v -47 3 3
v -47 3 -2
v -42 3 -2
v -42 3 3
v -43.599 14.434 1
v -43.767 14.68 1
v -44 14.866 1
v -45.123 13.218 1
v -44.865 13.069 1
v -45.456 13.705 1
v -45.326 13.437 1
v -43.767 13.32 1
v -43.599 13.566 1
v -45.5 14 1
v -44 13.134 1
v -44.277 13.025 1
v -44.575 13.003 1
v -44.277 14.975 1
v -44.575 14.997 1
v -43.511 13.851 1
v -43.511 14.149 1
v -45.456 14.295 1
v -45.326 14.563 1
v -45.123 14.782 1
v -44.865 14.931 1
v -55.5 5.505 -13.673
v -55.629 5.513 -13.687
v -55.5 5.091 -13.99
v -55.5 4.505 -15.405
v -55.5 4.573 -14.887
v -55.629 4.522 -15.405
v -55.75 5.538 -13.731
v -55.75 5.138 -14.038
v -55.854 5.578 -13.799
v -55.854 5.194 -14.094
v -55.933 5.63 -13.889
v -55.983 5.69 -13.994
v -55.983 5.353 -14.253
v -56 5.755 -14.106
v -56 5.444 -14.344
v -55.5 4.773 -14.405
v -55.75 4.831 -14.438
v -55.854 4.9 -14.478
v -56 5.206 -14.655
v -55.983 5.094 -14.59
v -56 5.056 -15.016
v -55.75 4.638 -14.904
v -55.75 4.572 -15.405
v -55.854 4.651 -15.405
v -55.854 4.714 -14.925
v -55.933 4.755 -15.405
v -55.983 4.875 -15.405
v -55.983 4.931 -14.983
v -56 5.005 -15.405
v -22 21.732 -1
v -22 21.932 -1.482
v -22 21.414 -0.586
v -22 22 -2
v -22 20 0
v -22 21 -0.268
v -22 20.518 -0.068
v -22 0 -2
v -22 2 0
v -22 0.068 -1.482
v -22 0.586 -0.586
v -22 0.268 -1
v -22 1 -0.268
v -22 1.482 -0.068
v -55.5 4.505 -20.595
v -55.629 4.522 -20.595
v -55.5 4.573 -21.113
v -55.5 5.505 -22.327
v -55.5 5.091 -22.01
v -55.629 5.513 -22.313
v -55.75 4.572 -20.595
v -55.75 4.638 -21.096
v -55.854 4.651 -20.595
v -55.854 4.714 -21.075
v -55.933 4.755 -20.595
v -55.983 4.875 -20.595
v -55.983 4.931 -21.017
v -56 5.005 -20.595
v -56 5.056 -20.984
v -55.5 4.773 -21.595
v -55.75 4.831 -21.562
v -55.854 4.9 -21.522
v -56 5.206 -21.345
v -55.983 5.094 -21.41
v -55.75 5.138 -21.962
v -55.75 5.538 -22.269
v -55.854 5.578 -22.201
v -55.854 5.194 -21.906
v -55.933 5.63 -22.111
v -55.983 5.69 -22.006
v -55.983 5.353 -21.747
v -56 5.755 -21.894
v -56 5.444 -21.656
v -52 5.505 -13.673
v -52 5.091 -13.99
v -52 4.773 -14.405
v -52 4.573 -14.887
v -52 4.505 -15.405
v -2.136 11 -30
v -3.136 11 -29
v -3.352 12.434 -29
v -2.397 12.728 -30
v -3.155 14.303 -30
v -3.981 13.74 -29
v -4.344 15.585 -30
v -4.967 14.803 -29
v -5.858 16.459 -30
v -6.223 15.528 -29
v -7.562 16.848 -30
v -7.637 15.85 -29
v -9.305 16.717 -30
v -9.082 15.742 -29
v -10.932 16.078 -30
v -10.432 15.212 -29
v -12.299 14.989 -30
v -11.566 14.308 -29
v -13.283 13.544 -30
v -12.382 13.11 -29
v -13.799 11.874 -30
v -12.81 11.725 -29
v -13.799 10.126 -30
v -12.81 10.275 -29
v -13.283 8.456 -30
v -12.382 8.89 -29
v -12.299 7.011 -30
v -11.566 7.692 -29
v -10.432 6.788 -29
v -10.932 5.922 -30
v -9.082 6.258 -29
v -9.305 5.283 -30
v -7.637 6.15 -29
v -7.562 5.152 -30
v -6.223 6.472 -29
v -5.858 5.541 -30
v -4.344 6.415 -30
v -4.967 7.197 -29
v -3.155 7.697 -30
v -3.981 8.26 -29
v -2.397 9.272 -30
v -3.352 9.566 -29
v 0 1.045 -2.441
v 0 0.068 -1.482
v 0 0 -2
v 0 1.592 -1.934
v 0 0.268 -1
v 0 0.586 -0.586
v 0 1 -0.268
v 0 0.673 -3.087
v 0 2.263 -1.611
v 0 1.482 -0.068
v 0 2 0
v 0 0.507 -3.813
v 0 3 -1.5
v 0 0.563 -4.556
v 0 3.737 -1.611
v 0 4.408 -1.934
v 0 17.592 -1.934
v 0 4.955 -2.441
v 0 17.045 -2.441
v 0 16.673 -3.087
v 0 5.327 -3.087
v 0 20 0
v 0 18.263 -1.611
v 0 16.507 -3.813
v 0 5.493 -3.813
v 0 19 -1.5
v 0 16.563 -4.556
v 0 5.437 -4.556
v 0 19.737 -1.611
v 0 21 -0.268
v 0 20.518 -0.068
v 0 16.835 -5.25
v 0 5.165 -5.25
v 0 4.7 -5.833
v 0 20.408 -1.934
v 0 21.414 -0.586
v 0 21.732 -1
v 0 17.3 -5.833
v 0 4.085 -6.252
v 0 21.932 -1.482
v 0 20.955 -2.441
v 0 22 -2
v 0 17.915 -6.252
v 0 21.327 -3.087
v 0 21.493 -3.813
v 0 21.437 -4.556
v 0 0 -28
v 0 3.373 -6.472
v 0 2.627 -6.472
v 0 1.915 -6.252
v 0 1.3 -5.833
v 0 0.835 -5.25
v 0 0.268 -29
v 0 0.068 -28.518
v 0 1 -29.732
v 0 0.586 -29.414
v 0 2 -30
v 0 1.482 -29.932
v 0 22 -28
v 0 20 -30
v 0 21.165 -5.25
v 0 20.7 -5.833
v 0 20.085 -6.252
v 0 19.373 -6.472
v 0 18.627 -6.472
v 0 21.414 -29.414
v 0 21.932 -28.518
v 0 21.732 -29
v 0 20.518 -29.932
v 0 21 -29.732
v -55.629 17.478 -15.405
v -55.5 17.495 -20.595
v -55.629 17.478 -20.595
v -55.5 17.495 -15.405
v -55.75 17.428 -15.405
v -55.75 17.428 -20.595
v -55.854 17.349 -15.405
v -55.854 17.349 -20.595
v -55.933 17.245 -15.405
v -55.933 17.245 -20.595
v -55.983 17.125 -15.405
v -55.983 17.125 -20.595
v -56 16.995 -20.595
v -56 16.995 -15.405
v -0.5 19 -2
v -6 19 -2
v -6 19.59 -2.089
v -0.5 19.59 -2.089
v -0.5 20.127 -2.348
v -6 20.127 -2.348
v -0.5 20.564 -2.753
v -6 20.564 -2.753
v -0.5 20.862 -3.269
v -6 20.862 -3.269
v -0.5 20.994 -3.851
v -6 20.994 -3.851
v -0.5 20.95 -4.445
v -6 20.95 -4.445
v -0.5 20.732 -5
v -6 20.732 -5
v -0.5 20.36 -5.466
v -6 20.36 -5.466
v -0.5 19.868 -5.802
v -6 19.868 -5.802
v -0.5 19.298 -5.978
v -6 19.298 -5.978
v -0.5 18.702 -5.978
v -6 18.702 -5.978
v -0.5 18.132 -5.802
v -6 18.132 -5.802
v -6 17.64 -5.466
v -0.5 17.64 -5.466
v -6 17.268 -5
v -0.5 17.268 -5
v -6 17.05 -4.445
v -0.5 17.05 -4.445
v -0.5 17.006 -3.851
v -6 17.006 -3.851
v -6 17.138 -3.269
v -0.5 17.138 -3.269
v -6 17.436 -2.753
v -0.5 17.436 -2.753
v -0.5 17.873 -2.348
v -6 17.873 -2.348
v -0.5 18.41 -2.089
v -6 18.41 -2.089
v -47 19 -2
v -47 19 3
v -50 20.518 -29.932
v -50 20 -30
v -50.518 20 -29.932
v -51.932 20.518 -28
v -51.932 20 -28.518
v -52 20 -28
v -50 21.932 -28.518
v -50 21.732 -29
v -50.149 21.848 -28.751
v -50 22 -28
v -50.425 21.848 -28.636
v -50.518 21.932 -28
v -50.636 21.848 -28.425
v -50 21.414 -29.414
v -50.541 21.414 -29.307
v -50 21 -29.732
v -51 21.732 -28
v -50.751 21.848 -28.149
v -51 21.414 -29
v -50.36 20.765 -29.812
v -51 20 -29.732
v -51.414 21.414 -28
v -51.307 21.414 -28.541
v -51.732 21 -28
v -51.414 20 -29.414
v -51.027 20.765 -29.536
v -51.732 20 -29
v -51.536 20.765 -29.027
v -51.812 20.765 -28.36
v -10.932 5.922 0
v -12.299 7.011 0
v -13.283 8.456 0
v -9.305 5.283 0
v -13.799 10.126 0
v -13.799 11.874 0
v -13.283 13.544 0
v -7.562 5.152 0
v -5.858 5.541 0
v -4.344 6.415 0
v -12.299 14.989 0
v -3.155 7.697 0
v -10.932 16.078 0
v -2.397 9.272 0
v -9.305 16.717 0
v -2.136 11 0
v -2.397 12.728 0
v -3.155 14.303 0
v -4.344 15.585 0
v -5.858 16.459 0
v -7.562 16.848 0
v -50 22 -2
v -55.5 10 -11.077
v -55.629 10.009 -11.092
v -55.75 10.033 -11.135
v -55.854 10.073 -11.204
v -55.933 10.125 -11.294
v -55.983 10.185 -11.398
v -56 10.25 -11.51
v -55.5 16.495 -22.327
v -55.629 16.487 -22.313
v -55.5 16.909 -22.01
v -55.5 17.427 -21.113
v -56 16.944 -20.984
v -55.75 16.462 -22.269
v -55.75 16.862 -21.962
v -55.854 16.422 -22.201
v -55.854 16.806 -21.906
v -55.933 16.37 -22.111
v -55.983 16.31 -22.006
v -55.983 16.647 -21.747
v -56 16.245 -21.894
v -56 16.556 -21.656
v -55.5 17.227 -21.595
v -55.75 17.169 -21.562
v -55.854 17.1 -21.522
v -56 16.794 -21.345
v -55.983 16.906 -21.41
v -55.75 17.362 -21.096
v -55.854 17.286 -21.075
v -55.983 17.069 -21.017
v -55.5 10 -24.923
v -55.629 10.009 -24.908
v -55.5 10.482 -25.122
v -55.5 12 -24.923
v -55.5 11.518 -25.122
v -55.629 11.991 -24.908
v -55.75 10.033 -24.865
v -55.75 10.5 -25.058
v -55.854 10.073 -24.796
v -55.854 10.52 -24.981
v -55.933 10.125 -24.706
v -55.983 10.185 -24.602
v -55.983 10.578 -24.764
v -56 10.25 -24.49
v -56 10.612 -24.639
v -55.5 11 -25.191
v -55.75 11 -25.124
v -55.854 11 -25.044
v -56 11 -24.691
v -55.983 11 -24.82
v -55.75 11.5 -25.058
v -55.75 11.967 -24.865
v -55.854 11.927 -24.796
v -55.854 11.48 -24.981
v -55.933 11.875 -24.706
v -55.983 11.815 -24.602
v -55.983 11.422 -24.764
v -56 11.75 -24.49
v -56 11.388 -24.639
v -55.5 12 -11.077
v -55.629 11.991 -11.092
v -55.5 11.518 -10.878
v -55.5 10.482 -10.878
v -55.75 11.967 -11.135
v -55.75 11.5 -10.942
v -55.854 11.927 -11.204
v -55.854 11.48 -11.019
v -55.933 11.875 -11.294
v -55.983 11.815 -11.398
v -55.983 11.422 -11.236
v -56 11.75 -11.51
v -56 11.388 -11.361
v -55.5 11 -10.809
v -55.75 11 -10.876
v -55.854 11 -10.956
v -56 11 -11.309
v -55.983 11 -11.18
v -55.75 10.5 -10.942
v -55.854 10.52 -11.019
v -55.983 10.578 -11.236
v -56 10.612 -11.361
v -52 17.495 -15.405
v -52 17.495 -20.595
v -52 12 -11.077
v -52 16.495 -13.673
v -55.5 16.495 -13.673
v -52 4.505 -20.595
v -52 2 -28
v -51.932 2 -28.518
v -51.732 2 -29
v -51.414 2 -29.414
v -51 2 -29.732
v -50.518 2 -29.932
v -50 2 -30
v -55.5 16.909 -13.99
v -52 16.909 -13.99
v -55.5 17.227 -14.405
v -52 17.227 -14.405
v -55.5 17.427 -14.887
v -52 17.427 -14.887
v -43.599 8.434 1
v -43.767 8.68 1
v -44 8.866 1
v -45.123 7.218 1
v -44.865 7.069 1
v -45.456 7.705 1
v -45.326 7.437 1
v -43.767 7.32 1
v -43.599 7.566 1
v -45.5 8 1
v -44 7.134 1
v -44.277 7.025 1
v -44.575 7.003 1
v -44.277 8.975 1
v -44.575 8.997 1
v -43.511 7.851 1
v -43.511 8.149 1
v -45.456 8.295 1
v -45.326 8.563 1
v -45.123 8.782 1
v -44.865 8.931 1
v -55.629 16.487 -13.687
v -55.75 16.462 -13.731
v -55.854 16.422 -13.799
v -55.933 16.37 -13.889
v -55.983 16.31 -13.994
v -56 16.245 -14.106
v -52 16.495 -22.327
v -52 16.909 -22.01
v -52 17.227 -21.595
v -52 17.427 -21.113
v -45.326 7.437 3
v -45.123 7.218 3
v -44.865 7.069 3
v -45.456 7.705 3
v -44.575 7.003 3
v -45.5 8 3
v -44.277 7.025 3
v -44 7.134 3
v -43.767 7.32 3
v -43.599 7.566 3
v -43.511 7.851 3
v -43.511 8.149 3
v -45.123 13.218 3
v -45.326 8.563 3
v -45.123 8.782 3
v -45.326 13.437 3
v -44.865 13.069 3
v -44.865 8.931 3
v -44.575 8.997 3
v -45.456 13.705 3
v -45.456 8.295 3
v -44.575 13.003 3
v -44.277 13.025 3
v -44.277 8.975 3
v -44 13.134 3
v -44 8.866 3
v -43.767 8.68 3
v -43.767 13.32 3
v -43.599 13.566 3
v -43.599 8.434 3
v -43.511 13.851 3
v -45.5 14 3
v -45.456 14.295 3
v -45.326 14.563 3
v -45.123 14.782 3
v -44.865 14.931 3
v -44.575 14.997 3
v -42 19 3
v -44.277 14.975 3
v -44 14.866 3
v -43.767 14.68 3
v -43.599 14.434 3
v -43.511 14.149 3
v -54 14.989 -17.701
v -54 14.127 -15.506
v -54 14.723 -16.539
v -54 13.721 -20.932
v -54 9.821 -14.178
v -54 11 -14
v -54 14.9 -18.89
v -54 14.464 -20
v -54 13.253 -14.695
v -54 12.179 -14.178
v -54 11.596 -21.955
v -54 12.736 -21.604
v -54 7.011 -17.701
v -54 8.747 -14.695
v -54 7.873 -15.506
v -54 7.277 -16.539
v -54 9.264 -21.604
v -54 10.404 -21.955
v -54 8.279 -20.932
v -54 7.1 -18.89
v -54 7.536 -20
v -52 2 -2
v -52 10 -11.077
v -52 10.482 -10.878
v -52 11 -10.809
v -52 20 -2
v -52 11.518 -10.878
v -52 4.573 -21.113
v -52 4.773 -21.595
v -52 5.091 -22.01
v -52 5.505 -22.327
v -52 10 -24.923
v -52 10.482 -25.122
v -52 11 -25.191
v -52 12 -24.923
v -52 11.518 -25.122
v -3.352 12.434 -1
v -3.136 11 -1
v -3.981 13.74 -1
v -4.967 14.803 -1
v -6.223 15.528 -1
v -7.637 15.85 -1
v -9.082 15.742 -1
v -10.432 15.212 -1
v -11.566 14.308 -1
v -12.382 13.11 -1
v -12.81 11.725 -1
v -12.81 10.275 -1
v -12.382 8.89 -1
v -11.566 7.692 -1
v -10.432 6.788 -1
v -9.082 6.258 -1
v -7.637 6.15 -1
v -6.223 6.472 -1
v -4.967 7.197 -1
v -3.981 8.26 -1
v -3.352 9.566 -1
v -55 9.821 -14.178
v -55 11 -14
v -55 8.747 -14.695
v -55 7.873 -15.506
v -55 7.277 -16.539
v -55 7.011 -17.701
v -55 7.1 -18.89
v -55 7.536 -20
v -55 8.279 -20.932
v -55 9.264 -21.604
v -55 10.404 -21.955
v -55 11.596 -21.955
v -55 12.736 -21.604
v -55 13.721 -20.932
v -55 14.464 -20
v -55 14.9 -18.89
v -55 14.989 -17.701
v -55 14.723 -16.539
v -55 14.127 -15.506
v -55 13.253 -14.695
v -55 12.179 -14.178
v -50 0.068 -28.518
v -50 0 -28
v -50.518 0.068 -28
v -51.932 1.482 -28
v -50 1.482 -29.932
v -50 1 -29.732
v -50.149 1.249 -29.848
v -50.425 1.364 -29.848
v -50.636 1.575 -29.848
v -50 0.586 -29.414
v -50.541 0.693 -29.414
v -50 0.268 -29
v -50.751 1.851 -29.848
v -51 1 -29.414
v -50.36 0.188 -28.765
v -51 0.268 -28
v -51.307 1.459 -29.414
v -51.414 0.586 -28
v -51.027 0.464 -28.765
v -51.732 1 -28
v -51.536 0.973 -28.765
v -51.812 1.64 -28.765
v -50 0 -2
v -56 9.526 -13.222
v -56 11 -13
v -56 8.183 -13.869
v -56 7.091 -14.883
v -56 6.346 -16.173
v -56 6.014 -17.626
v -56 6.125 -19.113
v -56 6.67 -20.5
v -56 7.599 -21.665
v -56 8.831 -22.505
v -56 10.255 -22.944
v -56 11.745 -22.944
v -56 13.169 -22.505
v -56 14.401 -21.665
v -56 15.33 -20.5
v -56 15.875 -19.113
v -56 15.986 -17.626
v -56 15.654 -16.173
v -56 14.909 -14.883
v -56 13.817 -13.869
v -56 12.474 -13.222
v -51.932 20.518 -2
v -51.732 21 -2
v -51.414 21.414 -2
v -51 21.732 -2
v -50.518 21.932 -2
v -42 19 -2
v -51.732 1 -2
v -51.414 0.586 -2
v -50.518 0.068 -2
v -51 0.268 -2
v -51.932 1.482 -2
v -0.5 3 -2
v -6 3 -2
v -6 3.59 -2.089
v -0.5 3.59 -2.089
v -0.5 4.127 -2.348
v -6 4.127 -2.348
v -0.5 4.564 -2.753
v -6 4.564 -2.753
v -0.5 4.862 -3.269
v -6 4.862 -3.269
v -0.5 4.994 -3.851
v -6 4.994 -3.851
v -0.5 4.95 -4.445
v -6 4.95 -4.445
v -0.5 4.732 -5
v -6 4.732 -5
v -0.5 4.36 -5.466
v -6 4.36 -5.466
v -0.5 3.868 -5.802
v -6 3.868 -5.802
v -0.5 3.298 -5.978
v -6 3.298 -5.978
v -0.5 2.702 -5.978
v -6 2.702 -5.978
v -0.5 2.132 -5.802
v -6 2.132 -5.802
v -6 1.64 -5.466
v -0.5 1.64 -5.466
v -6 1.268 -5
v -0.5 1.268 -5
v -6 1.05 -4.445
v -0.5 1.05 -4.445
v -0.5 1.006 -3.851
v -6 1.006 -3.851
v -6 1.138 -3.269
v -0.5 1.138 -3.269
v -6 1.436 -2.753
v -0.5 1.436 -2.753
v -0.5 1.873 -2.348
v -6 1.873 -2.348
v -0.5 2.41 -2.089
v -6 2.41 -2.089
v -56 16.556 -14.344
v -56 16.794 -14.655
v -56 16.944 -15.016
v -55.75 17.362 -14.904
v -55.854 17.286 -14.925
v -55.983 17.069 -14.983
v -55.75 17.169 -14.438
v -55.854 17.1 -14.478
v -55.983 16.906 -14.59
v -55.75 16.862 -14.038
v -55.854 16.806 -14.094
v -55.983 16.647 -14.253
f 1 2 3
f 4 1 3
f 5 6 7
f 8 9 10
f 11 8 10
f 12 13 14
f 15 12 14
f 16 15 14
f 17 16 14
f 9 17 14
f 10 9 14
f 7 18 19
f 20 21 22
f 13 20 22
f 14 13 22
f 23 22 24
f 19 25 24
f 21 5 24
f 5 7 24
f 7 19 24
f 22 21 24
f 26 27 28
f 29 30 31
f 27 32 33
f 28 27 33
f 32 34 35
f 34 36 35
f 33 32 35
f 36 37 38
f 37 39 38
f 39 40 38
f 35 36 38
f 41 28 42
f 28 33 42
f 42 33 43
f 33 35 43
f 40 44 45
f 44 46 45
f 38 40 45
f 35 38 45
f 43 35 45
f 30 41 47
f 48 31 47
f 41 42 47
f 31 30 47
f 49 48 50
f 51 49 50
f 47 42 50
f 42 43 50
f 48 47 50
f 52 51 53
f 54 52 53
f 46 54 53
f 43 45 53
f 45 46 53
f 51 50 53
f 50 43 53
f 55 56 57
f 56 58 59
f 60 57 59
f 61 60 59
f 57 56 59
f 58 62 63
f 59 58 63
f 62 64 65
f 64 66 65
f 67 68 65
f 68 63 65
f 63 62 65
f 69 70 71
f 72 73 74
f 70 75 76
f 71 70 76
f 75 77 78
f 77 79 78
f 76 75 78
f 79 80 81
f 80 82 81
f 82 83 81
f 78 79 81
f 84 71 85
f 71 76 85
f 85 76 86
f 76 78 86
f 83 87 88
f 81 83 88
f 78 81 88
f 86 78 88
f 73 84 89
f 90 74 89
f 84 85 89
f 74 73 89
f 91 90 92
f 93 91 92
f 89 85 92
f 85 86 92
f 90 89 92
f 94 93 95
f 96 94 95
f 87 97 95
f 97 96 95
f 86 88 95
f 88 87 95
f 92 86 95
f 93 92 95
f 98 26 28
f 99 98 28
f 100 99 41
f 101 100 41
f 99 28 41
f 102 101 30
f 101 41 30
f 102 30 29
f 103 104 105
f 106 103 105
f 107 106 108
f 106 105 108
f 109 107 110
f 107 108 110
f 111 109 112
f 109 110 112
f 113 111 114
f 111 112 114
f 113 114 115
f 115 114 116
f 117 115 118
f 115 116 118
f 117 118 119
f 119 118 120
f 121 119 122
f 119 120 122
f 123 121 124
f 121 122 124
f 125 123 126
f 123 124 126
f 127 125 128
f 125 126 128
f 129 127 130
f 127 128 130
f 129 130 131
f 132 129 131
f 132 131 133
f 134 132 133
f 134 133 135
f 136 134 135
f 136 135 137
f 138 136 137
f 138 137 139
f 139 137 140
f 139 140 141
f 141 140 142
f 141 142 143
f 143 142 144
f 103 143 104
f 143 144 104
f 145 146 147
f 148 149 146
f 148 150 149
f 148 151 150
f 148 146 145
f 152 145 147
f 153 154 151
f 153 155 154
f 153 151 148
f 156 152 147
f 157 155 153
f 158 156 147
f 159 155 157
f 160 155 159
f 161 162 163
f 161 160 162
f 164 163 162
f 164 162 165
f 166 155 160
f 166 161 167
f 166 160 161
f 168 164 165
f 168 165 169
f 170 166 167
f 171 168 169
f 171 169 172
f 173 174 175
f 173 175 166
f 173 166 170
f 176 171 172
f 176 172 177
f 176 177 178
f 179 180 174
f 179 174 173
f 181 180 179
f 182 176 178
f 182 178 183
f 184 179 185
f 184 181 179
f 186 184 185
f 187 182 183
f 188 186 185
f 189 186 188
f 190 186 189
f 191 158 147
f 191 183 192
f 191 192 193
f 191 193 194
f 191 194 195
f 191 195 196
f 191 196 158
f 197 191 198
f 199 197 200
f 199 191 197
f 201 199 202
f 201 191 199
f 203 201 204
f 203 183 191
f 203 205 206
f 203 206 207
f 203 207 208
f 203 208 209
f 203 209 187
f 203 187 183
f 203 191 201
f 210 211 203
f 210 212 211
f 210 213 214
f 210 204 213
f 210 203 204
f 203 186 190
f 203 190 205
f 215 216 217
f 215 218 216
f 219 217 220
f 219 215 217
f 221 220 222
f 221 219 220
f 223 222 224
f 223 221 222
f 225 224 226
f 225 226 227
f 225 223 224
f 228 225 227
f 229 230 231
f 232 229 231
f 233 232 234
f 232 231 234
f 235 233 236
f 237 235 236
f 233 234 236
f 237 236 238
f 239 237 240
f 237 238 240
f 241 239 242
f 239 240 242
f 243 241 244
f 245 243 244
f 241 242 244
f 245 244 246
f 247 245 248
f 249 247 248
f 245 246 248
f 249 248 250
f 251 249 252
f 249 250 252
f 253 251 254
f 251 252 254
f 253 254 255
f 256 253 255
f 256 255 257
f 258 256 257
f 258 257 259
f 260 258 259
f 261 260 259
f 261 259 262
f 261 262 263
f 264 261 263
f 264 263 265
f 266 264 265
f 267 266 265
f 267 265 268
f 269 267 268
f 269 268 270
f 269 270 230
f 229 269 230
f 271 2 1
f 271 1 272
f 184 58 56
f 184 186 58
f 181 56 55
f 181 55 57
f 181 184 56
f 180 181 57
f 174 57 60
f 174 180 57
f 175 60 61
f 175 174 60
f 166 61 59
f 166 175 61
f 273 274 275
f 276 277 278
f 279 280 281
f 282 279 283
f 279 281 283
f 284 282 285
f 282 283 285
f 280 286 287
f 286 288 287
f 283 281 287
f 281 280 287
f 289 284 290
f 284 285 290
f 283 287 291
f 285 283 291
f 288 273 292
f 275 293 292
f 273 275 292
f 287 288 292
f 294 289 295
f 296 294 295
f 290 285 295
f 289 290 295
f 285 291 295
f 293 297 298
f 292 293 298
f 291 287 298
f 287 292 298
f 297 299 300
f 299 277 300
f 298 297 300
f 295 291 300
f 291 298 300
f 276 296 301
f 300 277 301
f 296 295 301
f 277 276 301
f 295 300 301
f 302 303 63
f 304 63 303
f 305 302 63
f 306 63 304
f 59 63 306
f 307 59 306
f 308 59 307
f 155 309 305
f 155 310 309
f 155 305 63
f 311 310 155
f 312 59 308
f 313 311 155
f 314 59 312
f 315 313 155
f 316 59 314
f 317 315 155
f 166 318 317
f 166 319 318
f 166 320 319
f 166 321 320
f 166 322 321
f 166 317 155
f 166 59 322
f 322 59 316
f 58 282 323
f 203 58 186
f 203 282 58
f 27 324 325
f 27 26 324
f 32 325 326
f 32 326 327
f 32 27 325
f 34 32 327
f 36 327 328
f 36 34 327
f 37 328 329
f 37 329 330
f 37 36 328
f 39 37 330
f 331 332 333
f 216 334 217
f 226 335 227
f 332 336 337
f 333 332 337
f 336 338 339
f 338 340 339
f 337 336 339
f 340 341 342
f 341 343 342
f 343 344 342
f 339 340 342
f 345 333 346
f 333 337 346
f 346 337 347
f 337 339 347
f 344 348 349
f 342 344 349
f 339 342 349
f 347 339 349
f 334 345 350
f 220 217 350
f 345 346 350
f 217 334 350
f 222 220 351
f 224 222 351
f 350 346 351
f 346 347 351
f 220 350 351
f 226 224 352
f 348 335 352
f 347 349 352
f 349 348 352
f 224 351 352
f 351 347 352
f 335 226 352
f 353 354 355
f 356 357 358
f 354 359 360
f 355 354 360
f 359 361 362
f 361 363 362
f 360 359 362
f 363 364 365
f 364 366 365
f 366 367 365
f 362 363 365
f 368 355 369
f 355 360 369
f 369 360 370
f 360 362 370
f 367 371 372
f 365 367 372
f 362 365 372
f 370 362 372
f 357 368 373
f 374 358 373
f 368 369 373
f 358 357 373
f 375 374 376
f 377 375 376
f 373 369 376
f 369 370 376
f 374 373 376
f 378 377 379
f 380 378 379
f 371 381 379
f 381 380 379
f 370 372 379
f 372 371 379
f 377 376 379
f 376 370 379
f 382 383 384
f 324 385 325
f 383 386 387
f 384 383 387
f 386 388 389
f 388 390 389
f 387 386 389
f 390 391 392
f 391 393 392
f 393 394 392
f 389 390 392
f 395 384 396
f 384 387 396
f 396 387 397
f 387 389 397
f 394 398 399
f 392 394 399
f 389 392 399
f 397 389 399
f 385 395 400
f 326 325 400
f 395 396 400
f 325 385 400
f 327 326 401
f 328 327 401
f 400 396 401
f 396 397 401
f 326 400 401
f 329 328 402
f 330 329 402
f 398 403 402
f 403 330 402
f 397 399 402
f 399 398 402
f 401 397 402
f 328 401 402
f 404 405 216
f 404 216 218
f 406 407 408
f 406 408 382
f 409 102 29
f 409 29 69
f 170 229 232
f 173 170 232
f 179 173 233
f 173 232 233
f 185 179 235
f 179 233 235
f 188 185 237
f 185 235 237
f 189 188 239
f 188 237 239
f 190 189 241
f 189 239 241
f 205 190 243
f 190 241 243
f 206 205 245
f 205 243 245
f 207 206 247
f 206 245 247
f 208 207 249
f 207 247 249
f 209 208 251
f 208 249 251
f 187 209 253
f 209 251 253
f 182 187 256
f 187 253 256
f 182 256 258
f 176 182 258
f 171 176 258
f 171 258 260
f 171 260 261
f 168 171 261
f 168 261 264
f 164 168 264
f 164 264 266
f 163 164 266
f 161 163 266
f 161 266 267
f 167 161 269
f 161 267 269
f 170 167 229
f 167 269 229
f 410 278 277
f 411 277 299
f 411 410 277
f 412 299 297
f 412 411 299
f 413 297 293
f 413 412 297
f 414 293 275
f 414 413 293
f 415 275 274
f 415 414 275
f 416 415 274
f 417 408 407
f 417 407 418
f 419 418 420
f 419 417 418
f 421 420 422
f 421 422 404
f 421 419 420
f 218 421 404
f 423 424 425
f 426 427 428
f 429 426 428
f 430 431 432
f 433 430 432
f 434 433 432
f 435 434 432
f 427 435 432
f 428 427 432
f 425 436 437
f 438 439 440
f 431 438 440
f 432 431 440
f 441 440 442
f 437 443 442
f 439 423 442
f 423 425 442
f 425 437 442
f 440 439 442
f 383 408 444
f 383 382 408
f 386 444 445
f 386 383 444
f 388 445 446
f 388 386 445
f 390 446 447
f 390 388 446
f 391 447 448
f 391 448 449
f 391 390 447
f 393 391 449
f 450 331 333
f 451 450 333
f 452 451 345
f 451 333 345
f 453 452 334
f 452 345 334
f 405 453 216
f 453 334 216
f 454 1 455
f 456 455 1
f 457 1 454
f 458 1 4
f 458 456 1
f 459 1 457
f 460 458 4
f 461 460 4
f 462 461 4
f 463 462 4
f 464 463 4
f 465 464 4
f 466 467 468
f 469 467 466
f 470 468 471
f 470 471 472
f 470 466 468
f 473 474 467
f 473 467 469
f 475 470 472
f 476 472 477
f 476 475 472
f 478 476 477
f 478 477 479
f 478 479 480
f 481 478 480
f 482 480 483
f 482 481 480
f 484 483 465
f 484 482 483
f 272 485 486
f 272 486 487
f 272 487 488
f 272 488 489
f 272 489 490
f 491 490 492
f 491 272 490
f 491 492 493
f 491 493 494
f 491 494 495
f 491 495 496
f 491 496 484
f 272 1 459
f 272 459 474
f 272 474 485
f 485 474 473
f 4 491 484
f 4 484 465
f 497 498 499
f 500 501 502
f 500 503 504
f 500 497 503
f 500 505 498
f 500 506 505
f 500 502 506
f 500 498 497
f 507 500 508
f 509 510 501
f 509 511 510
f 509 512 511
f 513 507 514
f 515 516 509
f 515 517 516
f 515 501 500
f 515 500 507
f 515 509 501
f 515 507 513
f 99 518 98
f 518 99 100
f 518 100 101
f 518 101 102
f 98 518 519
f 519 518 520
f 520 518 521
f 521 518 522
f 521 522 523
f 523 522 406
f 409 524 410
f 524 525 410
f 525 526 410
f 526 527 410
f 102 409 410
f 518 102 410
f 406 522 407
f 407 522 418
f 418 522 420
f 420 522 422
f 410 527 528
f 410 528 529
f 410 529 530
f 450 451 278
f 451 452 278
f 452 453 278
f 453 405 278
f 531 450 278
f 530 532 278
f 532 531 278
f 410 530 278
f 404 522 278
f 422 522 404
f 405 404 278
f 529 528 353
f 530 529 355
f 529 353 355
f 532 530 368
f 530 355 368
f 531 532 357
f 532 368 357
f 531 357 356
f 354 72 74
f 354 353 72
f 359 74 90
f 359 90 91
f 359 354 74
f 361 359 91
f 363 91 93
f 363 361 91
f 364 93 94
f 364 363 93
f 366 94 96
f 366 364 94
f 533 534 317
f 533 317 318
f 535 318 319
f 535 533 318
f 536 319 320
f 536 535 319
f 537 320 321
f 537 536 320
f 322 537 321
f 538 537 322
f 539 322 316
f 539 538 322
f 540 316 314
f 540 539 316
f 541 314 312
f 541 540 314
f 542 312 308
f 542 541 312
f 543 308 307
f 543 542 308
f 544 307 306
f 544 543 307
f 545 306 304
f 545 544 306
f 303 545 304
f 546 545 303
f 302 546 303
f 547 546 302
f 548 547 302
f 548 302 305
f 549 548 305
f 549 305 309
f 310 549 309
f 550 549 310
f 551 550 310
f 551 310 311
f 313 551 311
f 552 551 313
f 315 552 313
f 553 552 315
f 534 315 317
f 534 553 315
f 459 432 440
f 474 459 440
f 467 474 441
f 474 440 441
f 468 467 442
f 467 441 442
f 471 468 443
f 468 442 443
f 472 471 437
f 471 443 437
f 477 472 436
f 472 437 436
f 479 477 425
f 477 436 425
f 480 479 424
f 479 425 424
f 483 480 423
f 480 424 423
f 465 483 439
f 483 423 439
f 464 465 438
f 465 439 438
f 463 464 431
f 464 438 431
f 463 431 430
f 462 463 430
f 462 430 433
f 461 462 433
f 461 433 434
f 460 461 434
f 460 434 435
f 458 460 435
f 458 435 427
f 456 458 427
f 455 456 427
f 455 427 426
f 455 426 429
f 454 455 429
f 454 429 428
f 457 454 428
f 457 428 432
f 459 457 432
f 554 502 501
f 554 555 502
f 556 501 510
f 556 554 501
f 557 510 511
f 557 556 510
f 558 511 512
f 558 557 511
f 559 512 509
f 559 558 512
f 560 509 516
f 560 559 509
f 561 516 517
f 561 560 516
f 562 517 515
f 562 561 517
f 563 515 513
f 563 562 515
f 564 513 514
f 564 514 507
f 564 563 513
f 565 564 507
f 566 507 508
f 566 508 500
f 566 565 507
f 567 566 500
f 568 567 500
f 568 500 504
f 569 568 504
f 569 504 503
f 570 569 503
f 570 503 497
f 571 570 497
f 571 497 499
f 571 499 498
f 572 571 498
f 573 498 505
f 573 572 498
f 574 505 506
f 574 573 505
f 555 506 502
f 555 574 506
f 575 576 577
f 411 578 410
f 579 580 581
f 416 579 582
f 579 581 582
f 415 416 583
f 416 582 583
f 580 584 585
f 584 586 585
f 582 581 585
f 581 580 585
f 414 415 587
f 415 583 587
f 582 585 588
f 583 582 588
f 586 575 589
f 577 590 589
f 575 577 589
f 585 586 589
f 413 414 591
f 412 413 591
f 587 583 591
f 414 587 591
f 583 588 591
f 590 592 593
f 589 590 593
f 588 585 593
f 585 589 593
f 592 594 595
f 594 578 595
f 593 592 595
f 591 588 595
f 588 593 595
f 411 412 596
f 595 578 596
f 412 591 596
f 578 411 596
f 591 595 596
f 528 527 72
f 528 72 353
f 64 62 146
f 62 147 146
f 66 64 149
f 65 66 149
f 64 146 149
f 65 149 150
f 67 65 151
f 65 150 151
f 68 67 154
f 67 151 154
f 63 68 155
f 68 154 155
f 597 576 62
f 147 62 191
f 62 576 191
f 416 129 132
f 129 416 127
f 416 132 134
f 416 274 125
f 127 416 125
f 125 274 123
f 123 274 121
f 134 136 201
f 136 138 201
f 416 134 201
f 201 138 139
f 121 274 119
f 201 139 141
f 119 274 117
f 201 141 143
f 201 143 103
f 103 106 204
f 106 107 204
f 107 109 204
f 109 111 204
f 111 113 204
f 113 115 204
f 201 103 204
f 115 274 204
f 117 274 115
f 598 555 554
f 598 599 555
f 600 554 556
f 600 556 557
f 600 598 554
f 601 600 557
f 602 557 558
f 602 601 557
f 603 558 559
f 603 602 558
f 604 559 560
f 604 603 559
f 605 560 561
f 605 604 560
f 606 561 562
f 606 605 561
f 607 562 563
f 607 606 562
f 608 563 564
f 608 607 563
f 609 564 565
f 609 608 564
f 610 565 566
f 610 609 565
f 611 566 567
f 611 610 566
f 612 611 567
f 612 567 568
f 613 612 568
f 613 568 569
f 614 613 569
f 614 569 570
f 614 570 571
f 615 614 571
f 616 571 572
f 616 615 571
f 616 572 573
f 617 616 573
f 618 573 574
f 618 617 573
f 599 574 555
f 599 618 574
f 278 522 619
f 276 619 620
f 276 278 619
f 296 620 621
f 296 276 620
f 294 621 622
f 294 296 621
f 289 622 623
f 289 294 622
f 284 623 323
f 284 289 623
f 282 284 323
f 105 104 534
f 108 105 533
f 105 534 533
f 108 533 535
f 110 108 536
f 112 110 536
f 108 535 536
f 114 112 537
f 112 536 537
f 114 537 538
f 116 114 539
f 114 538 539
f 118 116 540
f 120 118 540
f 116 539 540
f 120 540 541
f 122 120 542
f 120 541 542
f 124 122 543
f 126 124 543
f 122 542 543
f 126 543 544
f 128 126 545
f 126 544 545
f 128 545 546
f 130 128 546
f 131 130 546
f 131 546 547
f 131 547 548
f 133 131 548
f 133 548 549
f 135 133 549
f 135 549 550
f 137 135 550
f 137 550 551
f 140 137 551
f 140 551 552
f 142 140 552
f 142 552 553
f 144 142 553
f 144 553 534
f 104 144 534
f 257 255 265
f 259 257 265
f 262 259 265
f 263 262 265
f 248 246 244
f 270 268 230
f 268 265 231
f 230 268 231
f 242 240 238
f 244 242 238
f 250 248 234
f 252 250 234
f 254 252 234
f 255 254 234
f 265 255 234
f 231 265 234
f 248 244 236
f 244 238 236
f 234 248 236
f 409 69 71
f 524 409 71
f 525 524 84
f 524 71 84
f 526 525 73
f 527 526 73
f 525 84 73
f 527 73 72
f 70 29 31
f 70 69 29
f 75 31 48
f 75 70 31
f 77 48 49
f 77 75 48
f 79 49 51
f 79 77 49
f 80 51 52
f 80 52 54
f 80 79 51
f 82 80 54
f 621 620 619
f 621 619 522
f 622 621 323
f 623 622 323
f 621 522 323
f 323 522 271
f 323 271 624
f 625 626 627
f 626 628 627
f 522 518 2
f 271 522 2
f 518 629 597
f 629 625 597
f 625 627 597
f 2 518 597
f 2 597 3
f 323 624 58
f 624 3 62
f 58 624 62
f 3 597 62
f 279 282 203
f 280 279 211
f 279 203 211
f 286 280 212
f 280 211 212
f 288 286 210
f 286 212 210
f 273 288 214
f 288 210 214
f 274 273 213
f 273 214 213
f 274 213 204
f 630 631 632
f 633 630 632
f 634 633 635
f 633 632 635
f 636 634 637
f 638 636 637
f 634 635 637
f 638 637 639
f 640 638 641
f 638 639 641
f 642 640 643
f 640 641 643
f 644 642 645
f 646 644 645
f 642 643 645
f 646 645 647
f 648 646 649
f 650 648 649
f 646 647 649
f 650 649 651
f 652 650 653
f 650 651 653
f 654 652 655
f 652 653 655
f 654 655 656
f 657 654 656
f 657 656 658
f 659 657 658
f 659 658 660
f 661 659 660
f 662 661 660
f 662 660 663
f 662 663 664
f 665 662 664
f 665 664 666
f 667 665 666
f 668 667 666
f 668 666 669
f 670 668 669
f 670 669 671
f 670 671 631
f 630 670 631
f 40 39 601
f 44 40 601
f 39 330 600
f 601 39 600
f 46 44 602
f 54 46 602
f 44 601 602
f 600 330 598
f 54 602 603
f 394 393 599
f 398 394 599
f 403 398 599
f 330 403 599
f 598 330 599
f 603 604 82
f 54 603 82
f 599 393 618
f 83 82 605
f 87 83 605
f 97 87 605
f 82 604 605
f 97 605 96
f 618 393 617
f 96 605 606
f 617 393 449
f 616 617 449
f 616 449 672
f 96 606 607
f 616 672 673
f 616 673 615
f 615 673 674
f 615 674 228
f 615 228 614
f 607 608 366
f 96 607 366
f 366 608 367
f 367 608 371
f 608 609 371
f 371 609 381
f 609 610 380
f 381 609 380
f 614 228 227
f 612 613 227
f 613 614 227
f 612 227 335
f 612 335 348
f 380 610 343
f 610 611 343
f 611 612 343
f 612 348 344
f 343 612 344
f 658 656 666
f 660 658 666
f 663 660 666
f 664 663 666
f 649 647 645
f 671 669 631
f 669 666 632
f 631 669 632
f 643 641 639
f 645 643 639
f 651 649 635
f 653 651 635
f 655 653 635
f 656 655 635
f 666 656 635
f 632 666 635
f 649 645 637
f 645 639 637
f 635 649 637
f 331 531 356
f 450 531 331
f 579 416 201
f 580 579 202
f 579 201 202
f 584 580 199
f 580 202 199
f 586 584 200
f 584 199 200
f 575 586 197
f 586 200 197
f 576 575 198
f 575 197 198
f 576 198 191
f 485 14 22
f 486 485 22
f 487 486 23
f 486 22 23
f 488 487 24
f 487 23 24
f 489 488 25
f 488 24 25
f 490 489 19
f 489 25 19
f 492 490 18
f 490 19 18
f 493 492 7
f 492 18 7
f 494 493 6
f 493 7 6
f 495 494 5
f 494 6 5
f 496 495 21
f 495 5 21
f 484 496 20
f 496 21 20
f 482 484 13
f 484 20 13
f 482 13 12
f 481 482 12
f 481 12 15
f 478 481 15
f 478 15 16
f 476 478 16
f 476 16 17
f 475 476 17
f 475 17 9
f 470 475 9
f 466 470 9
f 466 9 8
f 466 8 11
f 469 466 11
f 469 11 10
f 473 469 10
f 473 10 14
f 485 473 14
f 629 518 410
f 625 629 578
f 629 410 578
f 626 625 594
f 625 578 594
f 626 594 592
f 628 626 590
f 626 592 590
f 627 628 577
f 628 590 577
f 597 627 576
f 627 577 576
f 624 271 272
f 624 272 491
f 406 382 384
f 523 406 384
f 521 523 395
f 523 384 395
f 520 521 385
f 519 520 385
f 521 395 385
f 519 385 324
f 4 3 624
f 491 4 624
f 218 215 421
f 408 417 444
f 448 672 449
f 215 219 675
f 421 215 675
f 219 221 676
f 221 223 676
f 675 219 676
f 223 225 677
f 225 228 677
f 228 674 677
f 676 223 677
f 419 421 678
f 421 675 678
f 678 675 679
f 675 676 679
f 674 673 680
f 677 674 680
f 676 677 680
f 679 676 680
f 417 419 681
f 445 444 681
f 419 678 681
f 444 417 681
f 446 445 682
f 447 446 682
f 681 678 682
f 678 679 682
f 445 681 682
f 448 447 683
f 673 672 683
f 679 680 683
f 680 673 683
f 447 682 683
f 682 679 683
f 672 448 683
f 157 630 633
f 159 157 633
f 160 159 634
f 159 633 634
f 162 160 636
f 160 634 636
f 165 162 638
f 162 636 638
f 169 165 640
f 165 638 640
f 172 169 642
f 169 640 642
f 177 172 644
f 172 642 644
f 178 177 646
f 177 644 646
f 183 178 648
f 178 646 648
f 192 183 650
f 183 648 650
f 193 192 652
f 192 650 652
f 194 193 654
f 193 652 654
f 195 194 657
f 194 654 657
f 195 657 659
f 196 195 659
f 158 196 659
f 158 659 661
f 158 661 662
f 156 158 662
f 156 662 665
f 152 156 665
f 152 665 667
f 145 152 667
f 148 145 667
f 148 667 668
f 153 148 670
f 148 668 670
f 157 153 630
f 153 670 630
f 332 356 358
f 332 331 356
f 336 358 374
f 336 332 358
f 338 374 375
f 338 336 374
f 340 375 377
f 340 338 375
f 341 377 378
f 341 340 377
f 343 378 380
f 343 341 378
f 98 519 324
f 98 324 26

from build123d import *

# Parameters (mm, degrees)
SKETCH_1_W                = 52
SKETCH_1_H                = 30
EXTRUDE_1_DEPTH           = 22
SKETCH_2_W                = 30
SKETCH_2_H                = 2
CUT_EXTRUDE_1_DEPTH       = 64.937469453
EXTRUDE_2_DEPTH           = 4
SKETCH_4_W                = 5
SKETCH_4_H                = 16
EXTRUDE_3_DEPTH           = 5
HOLE_WIZARD_4_0_4_1_D     = 4
HOLE_WIZARD_4_0_4_1_DEPTH = 6
HOLE_WIZARD_M81_D         = 9.728
HOLE_WIZARD_M81_DEPTH     = 33
HOLE_WIZARD_2_0_2_1_D     = 2
HOLE_WIZARD_2_0_2_1_DEPTH = 2
FILLET_1_R                = 2
CHAMFER_1_SIZE            = 1
CHAMFER_2_SIZE            = 0.5
FILLET_2_R                = 0.5


with BuildPart() as part:
    # Эскиз1 → Бобышка-Вытянуть1 (new body)
    with BuildSketch(Plane(origin=(0, 22, 0), x_dir=(1, 0, 0), z_dir=(0, 1, 0))):
        with Locations((-26, 15)):
            Rectangle(SKETCH_1_W, SKETCH_1_H)
    extrude(amount=-EXTRUDE_1_DEPTH)

    # Эскиз2 → Вырез-Вытянуть1 (cut, through all)
    with BuildSketch(Plane.XZ):
        with Locations((-37, -1)):
            Rectangle(SKETCH_2_W, SKETCH_2_H)
    extrude(amount=-CUT_EXTRUDE_1_DEPTH, mode=Mode.SUBTRACT)

    # Эскиз3 → Бобышка-Вытянуть2 (add)
    with BuildSketch(Plane.ZY.offset(52)):
        Polygon((-14.25, 17.495190528), (-10.5, 11), (-14.25, 4.504809472), (-21.75, 4.504809472), (-25.5, 11), (-21.75, 17.495190528), align=None)
    extrude(amount=EXTRUDE_2_DEPTH)

    # Эскиз4 → Бобышка-Вытянуть3 (add)
    with BuildSketch(Plane.XY.offset(-2)):
        with Locations((-44.5, 11)):
            Rectangle(SKETCH_4_W, SKETCH_4_H)
    extrude(amount=EXTRUDE_3_DEPTH)

    # Диаметр отверстия Ø4.0 (4)1
    with Locations(Plane(origin=(0, 0, 0), x_dir=(0, 0, -1), z_dir=(1, 0, 0))):
        with Locations((4, 3), (4, 19)):
            Hole(HOLE_WIZARD_4_0_4_1_D / 2, depth=HOLE_WIZARD_4_0_4_1_DEPTH)

    # Отверстие с зазором M81
    with Locations(Plane(origin=(0, 0, -30), x_dir=(-1, 0, 0), z_dir=(0, 0, -1))):
        with Locations((8, 11)):
            Hole(HOLE_WIZARD_M81_D / 2, depth=HOLE_WIZARD_M81_DEPTH)

    # Диаметр отверстия Ø2.0 (2)1
    with Locations(Plane.XY.offset(3)):
        with Locations((-44.5, 14), (-44.5, 8)):
            Hole(HOLE_WIZARD_2_0_2_1_D / 2, depth=HOLE_WIZARD_2_0_2_1_DEPTH)

    # Эскиз11 → Диаметр отверстия Ø8.0 (8)1 (revolve, cut)
    with BuildSketch(Plane(origin=(-56, 11, -18), x_dir=(0, 0, 1), z_dir=(0, 1, 0))):
        Polygon((0, 0), (0, 2), (4, 2), (4, 1), (5, 0), align=None)
    revolve(axis=Axis((-62.35, 11, -18), (1, 0, 0)), mode=Mode.SUBTRACT)

    # Скругление1
    fillet_1_edges = [part.edges().sort_by_distance(p)[0] for p in [
        (-52, 0, -16),
        (-26, 0, -30),
        (-52, 11, -30),
        (-26, 22, -30),
        (-52, 22, -16),
        (-11, 22, 0),
        (-11, 0, 0),
        (-54, 17.495190528, -21.75),
        (-54, 11, -25.5),
        (-54, 17.495190528, -14.25),
        (-54, 11, -10.5),
        (-54, 4.504809472, -14.25),
        (-54, 4.504809472, -21.75),
    ]]
    fillet(fillet_1_edges, radius=FILLET_1_R)

    # Фаска1
    chamfer_1_edges = [part.edges().sort_by_distance(p)[0] for p in [
        (-12.864, 11, 0),
        (-12.864, 11, -30),
    ]]
    chamfer(chamfer_1_edges, length=CHAMFER_1_SIZE)

    # Фаска2
    chamfer_2_edges = [part.edges().sort_by_distance(p)[0] for p in [
        (0, 19, -6),
        (0, 3, -6),
    ]]
    chamfer(chamfer_2_edges, length=CHAMFER_2_SIZE)

    # Скругление2
    fillet_2_edges = [part.edges().sort_by_distance(p)[0] for p in [
        (-56, 14.247595264, -23.625),
        (-56, 17.495190528, -18),
        (-56, 7.752404736, -23.625),
        (-56, 4.504809472, -18),
        (-56, 7.752404736, -12.375),
        (-56, 14.247595264, -12.375),
        (-56, 4.772758664, -21.595299462),
        (-56, 4.772758664, -14.404700538),
        (-56, 11, -10.809401077),
        (-56, 17.227241336, -14.404700538),
        (-56, 11, -25.190598923),
        (-56, 17.227241336, -21.595299462),
    ]]
    fillet(fillet_2_edges, radius=FILLET_2_R)


solid = part.part
